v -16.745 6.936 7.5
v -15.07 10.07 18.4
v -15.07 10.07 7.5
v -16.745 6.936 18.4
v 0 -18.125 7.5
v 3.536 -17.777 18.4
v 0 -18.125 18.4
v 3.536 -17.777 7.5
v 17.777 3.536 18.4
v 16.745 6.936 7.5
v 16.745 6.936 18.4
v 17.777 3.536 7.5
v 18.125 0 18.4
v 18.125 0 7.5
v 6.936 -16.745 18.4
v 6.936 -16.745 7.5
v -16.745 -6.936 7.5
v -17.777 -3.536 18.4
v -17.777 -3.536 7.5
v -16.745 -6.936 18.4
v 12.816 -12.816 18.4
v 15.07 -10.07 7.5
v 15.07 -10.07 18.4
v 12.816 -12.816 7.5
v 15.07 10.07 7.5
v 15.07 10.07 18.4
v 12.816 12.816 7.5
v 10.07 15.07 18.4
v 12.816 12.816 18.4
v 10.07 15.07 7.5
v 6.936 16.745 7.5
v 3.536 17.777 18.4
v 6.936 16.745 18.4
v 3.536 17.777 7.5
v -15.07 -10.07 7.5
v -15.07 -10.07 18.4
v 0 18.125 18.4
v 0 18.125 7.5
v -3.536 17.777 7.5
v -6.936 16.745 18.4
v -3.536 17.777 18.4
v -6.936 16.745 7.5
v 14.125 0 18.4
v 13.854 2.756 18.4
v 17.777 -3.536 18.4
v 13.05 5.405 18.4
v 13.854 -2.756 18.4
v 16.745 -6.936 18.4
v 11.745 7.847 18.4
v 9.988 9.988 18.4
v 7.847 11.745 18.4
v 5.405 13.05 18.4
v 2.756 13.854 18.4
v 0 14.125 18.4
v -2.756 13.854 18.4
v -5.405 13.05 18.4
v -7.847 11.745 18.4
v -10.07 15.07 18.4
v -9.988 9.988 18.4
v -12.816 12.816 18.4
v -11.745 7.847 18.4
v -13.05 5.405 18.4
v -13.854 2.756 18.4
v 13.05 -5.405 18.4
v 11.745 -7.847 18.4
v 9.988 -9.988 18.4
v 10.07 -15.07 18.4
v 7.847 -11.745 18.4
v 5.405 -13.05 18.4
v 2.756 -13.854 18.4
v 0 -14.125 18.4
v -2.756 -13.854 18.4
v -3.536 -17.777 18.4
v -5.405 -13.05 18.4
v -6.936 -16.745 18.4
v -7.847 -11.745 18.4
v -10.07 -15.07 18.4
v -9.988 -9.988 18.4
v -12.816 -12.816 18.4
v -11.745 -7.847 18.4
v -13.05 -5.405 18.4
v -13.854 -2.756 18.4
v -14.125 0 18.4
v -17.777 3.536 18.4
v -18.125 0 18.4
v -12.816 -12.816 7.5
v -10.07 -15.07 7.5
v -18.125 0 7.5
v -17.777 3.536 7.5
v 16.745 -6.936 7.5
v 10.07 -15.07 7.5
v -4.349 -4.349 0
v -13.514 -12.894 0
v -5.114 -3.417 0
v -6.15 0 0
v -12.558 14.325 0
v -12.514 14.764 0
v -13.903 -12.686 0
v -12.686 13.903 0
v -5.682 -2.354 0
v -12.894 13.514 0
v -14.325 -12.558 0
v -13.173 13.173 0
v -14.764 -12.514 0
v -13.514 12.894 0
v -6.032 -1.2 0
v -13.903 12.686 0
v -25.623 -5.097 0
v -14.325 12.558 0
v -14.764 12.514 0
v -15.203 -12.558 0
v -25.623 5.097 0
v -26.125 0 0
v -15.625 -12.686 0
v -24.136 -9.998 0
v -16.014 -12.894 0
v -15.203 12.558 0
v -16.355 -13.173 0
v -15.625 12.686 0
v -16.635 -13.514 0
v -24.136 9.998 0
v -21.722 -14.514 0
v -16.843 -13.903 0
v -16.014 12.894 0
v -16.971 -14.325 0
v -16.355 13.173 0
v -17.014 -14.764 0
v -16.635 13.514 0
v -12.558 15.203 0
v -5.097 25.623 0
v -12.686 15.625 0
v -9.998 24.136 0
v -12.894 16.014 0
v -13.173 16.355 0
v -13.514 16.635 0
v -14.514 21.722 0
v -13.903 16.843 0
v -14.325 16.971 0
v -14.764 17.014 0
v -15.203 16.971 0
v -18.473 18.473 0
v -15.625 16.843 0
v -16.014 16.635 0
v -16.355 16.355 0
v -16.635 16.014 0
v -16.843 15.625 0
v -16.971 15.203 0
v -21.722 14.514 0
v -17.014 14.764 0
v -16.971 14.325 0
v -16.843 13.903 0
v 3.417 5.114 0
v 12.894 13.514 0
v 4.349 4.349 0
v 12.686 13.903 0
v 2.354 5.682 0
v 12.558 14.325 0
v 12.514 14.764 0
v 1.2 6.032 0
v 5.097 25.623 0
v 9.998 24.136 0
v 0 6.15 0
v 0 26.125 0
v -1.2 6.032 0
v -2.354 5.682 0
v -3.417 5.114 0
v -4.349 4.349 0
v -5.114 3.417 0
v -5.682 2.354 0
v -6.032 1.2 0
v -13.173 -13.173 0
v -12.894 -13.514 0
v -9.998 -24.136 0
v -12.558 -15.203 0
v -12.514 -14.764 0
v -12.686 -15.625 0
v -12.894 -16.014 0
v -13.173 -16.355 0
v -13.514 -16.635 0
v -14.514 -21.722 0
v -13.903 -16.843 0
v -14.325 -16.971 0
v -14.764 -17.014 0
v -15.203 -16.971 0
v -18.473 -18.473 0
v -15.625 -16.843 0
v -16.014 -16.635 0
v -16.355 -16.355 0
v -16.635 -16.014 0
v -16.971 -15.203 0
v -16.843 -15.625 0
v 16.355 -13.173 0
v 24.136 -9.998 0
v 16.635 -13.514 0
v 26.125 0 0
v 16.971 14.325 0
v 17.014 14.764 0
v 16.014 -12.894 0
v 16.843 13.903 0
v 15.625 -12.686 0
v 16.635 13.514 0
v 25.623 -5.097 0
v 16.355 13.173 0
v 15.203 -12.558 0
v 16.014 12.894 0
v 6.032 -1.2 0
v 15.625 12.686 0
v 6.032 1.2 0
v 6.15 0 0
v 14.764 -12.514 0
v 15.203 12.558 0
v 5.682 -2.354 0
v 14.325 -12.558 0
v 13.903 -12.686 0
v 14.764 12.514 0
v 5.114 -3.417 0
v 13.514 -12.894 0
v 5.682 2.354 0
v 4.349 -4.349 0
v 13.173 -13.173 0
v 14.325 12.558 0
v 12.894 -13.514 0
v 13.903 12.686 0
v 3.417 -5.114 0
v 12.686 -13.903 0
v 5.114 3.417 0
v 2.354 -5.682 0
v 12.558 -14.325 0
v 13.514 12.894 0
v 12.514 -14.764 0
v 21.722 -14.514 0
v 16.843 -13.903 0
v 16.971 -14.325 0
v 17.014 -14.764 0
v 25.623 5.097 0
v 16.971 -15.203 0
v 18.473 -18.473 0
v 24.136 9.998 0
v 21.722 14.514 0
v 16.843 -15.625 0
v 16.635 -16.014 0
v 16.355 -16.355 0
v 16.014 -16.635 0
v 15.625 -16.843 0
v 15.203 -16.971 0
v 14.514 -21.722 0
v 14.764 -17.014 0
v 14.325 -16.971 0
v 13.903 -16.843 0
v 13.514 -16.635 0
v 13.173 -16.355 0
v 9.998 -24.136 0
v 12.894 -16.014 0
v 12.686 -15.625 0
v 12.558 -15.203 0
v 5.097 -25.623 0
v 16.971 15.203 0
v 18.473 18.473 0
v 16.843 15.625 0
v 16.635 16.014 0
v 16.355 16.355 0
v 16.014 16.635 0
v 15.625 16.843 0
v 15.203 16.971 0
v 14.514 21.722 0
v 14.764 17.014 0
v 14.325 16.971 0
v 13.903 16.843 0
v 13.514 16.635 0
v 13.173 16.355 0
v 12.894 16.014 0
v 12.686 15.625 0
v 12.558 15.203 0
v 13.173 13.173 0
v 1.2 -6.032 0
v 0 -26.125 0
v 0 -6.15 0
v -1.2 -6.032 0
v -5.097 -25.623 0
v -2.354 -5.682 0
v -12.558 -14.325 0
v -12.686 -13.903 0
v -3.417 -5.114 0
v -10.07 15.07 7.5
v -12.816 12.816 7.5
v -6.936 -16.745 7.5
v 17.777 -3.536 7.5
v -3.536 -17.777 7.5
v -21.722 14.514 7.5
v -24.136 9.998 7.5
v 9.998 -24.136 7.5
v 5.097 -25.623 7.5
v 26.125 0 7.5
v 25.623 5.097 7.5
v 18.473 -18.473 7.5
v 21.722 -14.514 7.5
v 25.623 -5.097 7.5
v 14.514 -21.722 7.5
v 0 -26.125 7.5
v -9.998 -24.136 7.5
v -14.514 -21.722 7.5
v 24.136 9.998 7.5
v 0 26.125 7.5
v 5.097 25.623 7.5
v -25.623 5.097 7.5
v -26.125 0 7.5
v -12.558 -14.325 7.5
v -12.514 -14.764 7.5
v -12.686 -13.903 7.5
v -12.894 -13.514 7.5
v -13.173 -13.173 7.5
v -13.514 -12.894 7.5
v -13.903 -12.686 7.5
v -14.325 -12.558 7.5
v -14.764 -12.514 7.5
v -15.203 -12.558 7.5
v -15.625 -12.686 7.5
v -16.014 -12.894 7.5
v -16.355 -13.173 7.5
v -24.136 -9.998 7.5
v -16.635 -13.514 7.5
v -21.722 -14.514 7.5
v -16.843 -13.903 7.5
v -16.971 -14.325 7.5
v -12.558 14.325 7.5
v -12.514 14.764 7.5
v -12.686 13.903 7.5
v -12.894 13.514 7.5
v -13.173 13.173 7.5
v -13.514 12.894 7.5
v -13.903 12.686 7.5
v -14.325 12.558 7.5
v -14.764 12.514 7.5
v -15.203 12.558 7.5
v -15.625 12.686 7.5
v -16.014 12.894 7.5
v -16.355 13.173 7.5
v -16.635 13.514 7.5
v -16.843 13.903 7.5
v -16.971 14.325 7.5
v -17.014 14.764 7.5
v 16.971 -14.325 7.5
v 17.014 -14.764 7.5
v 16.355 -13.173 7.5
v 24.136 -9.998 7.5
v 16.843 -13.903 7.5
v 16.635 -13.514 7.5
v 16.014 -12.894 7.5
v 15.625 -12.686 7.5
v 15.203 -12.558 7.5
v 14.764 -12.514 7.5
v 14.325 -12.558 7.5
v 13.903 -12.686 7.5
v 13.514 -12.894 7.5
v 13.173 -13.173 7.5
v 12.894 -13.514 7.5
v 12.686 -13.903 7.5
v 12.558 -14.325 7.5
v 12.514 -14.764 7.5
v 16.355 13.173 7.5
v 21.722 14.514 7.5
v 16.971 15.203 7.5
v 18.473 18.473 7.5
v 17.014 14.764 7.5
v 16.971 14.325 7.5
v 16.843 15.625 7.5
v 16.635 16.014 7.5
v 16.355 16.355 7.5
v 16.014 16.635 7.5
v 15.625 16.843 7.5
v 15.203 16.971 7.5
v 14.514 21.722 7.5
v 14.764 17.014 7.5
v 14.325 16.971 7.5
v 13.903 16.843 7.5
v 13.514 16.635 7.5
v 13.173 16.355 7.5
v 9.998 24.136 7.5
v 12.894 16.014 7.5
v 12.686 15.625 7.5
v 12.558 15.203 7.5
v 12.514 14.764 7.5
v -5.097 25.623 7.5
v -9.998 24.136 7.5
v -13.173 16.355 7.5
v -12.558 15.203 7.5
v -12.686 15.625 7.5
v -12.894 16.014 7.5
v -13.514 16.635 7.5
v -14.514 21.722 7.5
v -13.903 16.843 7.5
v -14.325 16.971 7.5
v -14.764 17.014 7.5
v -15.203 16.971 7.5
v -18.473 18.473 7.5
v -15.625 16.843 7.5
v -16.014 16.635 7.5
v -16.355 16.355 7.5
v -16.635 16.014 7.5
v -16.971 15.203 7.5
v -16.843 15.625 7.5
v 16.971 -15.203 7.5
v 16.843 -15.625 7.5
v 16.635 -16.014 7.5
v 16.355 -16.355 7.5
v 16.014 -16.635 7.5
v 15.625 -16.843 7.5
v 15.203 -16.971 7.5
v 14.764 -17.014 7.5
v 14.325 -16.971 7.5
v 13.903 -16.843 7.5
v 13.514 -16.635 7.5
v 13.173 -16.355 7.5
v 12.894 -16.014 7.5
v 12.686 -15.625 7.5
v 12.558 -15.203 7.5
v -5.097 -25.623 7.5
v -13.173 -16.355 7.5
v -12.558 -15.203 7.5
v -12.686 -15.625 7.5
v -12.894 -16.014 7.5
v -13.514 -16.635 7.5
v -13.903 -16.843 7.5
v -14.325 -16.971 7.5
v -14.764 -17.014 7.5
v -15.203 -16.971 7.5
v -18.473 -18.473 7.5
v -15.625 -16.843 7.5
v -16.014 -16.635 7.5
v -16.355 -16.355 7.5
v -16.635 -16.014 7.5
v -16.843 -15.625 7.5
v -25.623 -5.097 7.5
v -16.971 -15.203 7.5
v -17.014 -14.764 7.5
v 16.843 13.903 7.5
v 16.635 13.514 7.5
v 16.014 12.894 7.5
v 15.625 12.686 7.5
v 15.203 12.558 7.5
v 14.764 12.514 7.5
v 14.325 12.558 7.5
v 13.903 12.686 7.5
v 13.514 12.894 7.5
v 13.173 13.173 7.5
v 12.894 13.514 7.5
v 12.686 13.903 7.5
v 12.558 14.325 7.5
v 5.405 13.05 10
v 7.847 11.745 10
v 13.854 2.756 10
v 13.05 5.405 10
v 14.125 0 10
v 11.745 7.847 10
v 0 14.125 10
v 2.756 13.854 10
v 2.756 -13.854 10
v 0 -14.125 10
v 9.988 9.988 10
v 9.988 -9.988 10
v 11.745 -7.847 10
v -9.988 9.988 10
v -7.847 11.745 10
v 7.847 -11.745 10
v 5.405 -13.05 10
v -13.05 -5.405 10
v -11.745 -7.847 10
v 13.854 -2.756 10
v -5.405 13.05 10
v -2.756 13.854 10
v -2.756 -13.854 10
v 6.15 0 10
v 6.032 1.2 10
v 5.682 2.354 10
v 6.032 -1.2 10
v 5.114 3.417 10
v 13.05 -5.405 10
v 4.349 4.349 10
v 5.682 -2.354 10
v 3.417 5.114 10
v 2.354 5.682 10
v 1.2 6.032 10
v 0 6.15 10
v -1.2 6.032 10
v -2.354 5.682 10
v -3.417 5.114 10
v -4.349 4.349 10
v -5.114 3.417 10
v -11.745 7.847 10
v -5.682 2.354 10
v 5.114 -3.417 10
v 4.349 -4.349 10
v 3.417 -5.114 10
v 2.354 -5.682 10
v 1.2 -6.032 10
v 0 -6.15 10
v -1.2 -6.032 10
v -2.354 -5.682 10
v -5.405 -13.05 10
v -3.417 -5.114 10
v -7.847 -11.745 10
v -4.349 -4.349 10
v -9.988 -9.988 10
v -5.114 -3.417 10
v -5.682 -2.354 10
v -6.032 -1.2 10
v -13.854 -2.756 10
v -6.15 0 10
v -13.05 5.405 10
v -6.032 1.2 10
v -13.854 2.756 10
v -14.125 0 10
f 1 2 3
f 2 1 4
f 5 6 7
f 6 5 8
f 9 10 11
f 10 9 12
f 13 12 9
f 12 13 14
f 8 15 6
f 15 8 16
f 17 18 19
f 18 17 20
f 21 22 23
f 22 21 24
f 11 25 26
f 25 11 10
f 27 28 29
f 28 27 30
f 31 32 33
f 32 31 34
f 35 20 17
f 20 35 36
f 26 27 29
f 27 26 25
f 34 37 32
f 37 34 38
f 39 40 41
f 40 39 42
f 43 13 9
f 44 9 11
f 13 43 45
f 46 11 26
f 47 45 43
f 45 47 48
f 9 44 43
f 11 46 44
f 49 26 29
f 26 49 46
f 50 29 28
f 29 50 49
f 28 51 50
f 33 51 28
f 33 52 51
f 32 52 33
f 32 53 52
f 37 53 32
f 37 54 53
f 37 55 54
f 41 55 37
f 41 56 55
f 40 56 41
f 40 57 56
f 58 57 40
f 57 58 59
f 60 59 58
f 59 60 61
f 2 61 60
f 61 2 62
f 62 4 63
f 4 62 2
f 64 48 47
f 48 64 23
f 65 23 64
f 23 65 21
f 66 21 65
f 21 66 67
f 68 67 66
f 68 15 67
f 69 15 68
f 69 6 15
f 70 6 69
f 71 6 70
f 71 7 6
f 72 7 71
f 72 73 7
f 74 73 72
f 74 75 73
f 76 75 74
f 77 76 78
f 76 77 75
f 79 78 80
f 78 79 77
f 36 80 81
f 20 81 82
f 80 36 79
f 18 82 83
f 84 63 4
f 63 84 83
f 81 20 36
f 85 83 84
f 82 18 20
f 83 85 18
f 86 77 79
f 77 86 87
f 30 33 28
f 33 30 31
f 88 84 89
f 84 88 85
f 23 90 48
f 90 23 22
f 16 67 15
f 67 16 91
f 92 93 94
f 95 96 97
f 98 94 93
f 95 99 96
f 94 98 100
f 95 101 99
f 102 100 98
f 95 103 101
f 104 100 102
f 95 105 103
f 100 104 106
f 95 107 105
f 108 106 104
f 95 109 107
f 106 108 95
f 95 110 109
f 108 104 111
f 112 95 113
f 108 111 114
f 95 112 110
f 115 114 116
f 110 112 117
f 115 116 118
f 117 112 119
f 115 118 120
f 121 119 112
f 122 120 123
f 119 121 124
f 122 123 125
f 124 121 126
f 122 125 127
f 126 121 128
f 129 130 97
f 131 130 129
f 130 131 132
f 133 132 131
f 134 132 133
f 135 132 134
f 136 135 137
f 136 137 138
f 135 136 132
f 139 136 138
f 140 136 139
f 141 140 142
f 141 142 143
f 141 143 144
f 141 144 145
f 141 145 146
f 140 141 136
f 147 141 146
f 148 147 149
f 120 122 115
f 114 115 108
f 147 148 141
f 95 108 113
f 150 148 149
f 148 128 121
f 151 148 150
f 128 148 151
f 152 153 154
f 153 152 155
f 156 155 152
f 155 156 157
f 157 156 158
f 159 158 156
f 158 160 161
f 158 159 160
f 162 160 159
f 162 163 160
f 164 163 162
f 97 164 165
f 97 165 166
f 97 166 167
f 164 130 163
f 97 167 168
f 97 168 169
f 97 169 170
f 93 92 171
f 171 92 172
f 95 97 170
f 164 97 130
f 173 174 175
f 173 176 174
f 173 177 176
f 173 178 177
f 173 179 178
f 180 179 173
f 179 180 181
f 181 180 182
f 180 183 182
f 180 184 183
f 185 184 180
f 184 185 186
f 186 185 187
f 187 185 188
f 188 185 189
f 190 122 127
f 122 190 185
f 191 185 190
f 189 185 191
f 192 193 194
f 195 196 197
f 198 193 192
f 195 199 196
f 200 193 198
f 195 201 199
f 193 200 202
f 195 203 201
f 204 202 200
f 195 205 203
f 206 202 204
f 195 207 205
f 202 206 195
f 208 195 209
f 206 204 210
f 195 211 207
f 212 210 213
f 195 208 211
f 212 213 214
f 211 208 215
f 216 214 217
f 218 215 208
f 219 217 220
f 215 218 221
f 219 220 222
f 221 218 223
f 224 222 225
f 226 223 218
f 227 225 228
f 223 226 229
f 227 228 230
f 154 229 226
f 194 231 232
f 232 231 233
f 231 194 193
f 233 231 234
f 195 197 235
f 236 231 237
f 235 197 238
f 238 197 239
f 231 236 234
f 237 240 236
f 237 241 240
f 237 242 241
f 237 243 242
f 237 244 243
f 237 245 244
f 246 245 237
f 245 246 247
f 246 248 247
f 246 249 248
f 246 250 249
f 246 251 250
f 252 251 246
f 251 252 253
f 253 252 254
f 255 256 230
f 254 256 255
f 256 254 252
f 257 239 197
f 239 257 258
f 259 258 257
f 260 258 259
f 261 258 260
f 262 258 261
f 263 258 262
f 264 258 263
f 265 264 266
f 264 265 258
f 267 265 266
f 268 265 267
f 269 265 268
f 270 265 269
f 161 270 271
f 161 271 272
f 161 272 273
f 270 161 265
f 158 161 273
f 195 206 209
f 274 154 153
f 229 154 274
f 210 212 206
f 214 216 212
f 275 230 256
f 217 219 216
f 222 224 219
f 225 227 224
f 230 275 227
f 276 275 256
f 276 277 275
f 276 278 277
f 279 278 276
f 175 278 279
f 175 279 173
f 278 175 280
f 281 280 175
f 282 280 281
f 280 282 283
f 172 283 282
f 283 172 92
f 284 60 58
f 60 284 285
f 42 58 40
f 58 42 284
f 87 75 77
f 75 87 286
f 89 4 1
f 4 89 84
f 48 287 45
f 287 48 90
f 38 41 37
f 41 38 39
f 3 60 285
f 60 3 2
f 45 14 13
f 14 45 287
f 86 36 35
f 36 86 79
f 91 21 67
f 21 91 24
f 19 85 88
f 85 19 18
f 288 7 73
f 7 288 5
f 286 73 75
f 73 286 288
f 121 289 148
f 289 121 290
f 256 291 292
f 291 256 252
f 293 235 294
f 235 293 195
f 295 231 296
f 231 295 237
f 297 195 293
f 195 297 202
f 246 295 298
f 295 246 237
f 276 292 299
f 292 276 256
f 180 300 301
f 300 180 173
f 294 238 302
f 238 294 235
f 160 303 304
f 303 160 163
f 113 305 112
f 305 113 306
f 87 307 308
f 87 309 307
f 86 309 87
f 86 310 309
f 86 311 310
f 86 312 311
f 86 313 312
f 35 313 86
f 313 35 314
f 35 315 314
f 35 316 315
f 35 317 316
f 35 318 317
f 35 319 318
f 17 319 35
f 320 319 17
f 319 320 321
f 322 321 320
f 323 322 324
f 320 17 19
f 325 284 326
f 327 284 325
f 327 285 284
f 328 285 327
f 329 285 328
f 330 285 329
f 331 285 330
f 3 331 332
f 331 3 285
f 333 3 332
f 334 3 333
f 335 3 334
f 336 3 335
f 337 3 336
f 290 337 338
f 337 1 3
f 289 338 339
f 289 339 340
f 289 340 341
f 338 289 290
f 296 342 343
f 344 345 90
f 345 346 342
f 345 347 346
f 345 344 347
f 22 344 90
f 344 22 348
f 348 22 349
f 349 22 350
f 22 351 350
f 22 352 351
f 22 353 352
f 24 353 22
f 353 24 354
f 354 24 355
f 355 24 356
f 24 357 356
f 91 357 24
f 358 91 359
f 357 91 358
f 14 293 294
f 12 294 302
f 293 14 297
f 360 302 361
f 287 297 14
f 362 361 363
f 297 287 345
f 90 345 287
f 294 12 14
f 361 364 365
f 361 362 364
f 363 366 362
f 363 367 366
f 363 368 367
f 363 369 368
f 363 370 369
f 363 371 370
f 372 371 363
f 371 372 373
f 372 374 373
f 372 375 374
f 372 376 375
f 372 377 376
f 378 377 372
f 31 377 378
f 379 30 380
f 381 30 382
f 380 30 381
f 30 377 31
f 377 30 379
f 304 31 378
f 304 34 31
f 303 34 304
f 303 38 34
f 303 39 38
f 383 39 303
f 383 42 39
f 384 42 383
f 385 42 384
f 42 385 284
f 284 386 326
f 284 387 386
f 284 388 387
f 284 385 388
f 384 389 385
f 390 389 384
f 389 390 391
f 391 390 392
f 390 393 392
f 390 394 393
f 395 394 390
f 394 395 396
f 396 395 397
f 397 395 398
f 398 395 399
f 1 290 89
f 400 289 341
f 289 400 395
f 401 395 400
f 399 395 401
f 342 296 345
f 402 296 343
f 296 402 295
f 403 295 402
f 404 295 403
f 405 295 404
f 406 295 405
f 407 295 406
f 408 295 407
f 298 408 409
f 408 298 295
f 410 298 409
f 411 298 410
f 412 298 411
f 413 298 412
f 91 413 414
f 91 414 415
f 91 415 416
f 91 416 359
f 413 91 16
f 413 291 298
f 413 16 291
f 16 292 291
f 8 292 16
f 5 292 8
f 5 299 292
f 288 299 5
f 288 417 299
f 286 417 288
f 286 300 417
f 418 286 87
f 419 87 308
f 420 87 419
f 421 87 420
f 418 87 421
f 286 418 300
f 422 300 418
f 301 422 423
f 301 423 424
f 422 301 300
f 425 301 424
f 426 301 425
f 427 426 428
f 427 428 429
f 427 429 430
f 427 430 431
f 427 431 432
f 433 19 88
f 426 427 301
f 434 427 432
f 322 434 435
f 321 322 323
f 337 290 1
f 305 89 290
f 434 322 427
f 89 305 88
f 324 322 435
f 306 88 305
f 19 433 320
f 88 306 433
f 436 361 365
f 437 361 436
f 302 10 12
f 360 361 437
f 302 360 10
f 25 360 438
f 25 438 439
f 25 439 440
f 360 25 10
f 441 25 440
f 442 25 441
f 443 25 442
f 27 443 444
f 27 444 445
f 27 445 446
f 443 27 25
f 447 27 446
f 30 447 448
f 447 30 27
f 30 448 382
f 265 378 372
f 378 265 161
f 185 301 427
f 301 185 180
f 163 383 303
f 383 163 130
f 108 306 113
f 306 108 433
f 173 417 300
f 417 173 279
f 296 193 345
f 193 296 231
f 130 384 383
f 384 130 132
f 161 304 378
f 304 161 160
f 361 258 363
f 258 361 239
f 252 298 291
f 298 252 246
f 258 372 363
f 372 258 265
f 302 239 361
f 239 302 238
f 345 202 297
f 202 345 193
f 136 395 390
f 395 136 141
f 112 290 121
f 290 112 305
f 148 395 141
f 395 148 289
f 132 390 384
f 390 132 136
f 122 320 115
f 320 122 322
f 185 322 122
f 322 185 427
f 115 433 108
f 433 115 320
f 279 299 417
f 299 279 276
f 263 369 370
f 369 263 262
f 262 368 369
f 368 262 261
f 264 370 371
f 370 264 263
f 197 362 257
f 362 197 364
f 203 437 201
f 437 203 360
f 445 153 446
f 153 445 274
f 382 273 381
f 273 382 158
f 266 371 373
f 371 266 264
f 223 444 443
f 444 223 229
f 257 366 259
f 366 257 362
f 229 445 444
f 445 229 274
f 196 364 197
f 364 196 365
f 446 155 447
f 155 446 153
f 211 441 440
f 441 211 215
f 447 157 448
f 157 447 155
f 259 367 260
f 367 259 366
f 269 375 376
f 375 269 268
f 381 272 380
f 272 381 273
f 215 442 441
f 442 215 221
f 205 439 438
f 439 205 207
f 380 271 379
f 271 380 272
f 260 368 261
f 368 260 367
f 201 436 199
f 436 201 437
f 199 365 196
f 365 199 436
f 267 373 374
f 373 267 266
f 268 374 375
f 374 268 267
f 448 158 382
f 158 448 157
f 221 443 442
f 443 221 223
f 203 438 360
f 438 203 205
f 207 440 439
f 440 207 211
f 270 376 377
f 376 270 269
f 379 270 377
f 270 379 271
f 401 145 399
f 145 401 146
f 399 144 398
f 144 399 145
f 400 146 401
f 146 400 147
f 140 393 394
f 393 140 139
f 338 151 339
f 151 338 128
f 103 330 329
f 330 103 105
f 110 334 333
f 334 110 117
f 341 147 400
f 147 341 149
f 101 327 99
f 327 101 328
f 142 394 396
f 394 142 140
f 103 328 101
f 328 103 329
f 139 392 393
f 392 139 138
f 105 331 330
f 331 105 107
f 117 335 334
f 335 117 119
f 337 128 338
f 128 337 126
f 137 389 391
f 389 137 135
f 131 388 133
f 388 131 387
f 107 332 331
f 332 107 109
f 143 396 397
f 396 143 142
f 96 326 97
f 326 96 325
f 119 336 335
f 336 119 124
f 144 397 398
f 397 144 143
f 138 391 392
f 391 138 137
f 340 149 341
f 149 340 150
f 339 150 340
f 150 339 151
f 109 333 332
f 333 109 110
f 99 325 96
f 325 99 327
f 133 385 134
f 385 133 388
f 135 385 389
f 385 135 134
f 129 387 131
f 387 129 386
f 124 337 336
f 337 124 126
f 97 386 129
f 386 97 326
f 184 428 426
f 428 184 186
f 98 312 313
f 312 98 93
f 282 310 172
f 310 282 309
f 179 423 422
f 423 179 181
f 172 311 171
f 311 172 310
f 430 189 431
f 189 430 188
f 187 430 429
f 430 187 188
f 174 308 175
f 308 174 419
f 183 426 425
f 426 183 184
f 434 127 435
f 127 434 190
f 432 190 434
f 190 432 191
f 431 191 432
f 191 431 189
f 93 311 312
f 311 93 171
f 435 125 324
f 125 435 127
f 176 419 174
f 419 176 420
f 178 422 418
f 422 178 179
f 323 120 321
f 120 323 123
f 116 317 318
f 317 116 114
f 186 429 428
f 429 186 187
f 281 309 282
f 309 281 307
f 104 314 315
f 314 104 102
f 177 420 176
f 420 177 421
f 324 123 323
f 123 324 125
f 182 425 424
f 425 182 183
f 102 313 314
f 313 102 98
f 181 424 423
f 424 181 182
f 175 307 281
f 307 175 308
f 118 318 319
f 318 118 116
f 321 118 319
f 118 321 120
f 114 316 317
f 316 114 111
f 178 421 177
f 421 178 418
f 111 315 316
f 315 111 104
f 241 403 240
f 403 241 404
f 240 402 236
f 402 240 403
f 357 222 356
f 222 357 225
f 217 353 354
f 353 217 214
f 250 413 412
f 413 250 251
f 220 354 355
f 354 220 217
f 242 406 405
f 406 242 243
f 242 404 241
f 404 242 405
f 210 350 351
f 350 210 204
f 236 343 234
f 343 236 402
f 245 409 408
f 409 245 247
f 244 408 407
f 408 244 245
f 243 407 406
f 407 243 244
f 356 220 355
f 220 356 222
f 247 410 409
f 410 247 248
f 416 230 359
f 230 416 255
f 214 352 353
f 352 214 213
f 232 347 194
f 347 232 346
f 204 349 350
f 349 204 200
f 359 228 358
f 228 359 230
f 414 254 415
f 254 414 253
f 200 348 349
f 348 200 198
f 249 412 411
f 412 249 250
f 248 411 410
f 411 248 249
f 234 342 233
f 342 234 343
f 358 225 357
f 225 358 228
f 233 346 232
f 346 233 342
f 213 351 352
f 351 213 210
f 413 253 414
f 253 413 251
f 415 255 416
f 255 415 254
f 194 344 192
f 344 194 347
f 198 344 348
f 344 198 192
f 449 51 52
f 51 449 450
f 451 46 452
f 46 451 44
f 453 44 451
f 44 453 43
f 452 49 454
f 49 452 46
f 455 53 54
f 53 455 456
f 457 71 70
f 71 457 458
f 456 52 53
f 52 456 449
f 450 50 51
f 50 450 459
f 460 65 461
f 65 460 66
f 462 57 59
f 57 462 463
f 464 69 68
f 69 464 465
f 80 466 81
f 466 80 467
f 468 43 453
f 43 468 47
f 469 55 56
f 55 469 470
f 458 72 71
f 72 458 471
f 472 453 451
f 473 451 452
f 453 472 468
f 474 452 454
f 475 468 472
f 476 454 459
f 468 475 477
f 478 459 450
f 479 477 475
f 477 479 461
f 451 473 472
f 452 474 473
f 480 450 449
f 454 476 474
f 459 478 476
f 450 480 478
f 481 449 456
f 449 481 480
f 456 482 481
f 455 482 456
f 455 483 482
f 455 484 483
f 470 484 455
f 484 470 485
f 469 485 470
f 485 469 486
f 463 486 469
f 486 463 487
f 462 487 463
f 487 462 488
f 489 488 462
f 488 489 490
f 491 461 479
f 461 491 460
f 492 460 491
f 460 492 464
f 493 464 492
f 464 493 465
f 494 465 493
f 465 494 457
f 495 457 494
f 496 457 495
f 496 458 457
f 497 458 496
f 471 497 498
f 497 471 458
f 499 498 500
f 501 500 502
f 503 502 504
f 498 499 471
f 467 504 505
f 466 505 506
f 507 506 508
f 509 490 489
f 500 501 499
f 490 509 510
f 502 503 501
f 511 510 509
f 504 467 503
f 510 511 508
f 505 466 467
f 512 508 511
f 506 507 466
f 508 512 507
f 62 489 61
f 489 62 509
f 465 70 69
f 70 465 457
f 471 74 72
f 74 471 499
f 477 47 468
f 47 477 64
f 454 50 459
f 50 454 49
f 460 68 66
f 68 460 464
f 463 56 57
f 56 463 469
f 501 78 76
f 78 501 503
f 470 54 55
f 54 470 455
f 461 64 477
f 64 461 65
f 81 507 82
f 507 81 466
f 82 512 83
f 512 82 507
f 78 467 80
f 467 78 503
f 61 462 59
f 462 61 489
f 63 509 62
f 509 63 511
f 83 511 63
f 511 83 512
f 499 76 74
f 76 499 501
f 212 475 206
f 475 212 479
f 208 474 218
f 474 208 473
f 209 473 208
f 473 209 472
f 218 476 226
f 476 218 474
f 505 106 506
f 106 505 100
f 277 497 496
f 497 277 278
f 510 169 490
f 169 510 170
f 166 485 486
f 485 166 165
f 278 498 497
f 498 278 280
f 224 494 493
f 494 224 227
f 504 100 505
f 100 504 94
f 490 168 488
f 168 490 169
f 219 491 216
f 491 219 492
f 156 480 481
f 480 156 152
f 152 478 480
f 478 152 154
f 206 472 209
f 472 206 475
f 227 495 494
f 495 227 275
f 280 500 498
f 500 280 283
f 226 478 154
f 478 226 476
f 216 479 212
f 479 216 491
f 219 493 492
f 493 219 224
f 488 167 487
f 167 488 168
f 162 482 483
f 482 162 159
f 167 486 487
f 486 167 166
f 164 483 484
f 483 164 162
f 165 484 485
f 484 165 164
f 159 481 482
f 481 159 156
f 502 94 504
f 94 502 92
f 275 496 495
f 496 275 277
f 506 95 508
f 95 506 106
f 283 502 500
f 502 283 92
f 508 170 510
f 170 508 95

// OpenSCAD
$fn = 32;

// ----------------------------------------------------------------------
// Bearing housing: seat for 6001 (28 x 8 mm), 36.25 mm body
// ----------------------------------------------------------------------

// --- parameters (mm) ---
case_d = 36.25;           // housing outside diameter
case_h = 18.4;            // overall housing height
rim_t = 4;                // wall thickness
bearing_seat = 28.25;     // 6001 seat, 0.25 mm clearance
seat_h = 8.4;             // pocket depth
shoulder = 4;             // shoulder under the bearing
pass_d = 12.3;            // shaft passage
ear_d = 52.25;            // mounting flange diameter
flange_t = 6;             // flange thickness
bolt_d = 4.5;             // flange bolt clearance
bolt_r = 20.88;           // flange bolt circle radius

module body() {
  cylinder(h = case_h, d = case_d);
}

module flange() {
  /* flange sunk 1.5 mm into the body */
  cylinder(h = flange_t + 1.5, d = ear_d);
}

difference() {
  union() {
    body();
    flange();
  }
  translate([0, 0, case_h - seat_h]) cylinder(h = seat_h + 1, d = bearing_seat);
  translate([0, 0, -1]) cylinder(h = case_h - seat_h + 1, d = pass_d);
  for (i = [0 : 3]) rotate([0, 0, 45 + i * 90]) translate([bolt_r, 0, -1])
    cylinder(h = flange_t + 3, d = bolt_d);
}
